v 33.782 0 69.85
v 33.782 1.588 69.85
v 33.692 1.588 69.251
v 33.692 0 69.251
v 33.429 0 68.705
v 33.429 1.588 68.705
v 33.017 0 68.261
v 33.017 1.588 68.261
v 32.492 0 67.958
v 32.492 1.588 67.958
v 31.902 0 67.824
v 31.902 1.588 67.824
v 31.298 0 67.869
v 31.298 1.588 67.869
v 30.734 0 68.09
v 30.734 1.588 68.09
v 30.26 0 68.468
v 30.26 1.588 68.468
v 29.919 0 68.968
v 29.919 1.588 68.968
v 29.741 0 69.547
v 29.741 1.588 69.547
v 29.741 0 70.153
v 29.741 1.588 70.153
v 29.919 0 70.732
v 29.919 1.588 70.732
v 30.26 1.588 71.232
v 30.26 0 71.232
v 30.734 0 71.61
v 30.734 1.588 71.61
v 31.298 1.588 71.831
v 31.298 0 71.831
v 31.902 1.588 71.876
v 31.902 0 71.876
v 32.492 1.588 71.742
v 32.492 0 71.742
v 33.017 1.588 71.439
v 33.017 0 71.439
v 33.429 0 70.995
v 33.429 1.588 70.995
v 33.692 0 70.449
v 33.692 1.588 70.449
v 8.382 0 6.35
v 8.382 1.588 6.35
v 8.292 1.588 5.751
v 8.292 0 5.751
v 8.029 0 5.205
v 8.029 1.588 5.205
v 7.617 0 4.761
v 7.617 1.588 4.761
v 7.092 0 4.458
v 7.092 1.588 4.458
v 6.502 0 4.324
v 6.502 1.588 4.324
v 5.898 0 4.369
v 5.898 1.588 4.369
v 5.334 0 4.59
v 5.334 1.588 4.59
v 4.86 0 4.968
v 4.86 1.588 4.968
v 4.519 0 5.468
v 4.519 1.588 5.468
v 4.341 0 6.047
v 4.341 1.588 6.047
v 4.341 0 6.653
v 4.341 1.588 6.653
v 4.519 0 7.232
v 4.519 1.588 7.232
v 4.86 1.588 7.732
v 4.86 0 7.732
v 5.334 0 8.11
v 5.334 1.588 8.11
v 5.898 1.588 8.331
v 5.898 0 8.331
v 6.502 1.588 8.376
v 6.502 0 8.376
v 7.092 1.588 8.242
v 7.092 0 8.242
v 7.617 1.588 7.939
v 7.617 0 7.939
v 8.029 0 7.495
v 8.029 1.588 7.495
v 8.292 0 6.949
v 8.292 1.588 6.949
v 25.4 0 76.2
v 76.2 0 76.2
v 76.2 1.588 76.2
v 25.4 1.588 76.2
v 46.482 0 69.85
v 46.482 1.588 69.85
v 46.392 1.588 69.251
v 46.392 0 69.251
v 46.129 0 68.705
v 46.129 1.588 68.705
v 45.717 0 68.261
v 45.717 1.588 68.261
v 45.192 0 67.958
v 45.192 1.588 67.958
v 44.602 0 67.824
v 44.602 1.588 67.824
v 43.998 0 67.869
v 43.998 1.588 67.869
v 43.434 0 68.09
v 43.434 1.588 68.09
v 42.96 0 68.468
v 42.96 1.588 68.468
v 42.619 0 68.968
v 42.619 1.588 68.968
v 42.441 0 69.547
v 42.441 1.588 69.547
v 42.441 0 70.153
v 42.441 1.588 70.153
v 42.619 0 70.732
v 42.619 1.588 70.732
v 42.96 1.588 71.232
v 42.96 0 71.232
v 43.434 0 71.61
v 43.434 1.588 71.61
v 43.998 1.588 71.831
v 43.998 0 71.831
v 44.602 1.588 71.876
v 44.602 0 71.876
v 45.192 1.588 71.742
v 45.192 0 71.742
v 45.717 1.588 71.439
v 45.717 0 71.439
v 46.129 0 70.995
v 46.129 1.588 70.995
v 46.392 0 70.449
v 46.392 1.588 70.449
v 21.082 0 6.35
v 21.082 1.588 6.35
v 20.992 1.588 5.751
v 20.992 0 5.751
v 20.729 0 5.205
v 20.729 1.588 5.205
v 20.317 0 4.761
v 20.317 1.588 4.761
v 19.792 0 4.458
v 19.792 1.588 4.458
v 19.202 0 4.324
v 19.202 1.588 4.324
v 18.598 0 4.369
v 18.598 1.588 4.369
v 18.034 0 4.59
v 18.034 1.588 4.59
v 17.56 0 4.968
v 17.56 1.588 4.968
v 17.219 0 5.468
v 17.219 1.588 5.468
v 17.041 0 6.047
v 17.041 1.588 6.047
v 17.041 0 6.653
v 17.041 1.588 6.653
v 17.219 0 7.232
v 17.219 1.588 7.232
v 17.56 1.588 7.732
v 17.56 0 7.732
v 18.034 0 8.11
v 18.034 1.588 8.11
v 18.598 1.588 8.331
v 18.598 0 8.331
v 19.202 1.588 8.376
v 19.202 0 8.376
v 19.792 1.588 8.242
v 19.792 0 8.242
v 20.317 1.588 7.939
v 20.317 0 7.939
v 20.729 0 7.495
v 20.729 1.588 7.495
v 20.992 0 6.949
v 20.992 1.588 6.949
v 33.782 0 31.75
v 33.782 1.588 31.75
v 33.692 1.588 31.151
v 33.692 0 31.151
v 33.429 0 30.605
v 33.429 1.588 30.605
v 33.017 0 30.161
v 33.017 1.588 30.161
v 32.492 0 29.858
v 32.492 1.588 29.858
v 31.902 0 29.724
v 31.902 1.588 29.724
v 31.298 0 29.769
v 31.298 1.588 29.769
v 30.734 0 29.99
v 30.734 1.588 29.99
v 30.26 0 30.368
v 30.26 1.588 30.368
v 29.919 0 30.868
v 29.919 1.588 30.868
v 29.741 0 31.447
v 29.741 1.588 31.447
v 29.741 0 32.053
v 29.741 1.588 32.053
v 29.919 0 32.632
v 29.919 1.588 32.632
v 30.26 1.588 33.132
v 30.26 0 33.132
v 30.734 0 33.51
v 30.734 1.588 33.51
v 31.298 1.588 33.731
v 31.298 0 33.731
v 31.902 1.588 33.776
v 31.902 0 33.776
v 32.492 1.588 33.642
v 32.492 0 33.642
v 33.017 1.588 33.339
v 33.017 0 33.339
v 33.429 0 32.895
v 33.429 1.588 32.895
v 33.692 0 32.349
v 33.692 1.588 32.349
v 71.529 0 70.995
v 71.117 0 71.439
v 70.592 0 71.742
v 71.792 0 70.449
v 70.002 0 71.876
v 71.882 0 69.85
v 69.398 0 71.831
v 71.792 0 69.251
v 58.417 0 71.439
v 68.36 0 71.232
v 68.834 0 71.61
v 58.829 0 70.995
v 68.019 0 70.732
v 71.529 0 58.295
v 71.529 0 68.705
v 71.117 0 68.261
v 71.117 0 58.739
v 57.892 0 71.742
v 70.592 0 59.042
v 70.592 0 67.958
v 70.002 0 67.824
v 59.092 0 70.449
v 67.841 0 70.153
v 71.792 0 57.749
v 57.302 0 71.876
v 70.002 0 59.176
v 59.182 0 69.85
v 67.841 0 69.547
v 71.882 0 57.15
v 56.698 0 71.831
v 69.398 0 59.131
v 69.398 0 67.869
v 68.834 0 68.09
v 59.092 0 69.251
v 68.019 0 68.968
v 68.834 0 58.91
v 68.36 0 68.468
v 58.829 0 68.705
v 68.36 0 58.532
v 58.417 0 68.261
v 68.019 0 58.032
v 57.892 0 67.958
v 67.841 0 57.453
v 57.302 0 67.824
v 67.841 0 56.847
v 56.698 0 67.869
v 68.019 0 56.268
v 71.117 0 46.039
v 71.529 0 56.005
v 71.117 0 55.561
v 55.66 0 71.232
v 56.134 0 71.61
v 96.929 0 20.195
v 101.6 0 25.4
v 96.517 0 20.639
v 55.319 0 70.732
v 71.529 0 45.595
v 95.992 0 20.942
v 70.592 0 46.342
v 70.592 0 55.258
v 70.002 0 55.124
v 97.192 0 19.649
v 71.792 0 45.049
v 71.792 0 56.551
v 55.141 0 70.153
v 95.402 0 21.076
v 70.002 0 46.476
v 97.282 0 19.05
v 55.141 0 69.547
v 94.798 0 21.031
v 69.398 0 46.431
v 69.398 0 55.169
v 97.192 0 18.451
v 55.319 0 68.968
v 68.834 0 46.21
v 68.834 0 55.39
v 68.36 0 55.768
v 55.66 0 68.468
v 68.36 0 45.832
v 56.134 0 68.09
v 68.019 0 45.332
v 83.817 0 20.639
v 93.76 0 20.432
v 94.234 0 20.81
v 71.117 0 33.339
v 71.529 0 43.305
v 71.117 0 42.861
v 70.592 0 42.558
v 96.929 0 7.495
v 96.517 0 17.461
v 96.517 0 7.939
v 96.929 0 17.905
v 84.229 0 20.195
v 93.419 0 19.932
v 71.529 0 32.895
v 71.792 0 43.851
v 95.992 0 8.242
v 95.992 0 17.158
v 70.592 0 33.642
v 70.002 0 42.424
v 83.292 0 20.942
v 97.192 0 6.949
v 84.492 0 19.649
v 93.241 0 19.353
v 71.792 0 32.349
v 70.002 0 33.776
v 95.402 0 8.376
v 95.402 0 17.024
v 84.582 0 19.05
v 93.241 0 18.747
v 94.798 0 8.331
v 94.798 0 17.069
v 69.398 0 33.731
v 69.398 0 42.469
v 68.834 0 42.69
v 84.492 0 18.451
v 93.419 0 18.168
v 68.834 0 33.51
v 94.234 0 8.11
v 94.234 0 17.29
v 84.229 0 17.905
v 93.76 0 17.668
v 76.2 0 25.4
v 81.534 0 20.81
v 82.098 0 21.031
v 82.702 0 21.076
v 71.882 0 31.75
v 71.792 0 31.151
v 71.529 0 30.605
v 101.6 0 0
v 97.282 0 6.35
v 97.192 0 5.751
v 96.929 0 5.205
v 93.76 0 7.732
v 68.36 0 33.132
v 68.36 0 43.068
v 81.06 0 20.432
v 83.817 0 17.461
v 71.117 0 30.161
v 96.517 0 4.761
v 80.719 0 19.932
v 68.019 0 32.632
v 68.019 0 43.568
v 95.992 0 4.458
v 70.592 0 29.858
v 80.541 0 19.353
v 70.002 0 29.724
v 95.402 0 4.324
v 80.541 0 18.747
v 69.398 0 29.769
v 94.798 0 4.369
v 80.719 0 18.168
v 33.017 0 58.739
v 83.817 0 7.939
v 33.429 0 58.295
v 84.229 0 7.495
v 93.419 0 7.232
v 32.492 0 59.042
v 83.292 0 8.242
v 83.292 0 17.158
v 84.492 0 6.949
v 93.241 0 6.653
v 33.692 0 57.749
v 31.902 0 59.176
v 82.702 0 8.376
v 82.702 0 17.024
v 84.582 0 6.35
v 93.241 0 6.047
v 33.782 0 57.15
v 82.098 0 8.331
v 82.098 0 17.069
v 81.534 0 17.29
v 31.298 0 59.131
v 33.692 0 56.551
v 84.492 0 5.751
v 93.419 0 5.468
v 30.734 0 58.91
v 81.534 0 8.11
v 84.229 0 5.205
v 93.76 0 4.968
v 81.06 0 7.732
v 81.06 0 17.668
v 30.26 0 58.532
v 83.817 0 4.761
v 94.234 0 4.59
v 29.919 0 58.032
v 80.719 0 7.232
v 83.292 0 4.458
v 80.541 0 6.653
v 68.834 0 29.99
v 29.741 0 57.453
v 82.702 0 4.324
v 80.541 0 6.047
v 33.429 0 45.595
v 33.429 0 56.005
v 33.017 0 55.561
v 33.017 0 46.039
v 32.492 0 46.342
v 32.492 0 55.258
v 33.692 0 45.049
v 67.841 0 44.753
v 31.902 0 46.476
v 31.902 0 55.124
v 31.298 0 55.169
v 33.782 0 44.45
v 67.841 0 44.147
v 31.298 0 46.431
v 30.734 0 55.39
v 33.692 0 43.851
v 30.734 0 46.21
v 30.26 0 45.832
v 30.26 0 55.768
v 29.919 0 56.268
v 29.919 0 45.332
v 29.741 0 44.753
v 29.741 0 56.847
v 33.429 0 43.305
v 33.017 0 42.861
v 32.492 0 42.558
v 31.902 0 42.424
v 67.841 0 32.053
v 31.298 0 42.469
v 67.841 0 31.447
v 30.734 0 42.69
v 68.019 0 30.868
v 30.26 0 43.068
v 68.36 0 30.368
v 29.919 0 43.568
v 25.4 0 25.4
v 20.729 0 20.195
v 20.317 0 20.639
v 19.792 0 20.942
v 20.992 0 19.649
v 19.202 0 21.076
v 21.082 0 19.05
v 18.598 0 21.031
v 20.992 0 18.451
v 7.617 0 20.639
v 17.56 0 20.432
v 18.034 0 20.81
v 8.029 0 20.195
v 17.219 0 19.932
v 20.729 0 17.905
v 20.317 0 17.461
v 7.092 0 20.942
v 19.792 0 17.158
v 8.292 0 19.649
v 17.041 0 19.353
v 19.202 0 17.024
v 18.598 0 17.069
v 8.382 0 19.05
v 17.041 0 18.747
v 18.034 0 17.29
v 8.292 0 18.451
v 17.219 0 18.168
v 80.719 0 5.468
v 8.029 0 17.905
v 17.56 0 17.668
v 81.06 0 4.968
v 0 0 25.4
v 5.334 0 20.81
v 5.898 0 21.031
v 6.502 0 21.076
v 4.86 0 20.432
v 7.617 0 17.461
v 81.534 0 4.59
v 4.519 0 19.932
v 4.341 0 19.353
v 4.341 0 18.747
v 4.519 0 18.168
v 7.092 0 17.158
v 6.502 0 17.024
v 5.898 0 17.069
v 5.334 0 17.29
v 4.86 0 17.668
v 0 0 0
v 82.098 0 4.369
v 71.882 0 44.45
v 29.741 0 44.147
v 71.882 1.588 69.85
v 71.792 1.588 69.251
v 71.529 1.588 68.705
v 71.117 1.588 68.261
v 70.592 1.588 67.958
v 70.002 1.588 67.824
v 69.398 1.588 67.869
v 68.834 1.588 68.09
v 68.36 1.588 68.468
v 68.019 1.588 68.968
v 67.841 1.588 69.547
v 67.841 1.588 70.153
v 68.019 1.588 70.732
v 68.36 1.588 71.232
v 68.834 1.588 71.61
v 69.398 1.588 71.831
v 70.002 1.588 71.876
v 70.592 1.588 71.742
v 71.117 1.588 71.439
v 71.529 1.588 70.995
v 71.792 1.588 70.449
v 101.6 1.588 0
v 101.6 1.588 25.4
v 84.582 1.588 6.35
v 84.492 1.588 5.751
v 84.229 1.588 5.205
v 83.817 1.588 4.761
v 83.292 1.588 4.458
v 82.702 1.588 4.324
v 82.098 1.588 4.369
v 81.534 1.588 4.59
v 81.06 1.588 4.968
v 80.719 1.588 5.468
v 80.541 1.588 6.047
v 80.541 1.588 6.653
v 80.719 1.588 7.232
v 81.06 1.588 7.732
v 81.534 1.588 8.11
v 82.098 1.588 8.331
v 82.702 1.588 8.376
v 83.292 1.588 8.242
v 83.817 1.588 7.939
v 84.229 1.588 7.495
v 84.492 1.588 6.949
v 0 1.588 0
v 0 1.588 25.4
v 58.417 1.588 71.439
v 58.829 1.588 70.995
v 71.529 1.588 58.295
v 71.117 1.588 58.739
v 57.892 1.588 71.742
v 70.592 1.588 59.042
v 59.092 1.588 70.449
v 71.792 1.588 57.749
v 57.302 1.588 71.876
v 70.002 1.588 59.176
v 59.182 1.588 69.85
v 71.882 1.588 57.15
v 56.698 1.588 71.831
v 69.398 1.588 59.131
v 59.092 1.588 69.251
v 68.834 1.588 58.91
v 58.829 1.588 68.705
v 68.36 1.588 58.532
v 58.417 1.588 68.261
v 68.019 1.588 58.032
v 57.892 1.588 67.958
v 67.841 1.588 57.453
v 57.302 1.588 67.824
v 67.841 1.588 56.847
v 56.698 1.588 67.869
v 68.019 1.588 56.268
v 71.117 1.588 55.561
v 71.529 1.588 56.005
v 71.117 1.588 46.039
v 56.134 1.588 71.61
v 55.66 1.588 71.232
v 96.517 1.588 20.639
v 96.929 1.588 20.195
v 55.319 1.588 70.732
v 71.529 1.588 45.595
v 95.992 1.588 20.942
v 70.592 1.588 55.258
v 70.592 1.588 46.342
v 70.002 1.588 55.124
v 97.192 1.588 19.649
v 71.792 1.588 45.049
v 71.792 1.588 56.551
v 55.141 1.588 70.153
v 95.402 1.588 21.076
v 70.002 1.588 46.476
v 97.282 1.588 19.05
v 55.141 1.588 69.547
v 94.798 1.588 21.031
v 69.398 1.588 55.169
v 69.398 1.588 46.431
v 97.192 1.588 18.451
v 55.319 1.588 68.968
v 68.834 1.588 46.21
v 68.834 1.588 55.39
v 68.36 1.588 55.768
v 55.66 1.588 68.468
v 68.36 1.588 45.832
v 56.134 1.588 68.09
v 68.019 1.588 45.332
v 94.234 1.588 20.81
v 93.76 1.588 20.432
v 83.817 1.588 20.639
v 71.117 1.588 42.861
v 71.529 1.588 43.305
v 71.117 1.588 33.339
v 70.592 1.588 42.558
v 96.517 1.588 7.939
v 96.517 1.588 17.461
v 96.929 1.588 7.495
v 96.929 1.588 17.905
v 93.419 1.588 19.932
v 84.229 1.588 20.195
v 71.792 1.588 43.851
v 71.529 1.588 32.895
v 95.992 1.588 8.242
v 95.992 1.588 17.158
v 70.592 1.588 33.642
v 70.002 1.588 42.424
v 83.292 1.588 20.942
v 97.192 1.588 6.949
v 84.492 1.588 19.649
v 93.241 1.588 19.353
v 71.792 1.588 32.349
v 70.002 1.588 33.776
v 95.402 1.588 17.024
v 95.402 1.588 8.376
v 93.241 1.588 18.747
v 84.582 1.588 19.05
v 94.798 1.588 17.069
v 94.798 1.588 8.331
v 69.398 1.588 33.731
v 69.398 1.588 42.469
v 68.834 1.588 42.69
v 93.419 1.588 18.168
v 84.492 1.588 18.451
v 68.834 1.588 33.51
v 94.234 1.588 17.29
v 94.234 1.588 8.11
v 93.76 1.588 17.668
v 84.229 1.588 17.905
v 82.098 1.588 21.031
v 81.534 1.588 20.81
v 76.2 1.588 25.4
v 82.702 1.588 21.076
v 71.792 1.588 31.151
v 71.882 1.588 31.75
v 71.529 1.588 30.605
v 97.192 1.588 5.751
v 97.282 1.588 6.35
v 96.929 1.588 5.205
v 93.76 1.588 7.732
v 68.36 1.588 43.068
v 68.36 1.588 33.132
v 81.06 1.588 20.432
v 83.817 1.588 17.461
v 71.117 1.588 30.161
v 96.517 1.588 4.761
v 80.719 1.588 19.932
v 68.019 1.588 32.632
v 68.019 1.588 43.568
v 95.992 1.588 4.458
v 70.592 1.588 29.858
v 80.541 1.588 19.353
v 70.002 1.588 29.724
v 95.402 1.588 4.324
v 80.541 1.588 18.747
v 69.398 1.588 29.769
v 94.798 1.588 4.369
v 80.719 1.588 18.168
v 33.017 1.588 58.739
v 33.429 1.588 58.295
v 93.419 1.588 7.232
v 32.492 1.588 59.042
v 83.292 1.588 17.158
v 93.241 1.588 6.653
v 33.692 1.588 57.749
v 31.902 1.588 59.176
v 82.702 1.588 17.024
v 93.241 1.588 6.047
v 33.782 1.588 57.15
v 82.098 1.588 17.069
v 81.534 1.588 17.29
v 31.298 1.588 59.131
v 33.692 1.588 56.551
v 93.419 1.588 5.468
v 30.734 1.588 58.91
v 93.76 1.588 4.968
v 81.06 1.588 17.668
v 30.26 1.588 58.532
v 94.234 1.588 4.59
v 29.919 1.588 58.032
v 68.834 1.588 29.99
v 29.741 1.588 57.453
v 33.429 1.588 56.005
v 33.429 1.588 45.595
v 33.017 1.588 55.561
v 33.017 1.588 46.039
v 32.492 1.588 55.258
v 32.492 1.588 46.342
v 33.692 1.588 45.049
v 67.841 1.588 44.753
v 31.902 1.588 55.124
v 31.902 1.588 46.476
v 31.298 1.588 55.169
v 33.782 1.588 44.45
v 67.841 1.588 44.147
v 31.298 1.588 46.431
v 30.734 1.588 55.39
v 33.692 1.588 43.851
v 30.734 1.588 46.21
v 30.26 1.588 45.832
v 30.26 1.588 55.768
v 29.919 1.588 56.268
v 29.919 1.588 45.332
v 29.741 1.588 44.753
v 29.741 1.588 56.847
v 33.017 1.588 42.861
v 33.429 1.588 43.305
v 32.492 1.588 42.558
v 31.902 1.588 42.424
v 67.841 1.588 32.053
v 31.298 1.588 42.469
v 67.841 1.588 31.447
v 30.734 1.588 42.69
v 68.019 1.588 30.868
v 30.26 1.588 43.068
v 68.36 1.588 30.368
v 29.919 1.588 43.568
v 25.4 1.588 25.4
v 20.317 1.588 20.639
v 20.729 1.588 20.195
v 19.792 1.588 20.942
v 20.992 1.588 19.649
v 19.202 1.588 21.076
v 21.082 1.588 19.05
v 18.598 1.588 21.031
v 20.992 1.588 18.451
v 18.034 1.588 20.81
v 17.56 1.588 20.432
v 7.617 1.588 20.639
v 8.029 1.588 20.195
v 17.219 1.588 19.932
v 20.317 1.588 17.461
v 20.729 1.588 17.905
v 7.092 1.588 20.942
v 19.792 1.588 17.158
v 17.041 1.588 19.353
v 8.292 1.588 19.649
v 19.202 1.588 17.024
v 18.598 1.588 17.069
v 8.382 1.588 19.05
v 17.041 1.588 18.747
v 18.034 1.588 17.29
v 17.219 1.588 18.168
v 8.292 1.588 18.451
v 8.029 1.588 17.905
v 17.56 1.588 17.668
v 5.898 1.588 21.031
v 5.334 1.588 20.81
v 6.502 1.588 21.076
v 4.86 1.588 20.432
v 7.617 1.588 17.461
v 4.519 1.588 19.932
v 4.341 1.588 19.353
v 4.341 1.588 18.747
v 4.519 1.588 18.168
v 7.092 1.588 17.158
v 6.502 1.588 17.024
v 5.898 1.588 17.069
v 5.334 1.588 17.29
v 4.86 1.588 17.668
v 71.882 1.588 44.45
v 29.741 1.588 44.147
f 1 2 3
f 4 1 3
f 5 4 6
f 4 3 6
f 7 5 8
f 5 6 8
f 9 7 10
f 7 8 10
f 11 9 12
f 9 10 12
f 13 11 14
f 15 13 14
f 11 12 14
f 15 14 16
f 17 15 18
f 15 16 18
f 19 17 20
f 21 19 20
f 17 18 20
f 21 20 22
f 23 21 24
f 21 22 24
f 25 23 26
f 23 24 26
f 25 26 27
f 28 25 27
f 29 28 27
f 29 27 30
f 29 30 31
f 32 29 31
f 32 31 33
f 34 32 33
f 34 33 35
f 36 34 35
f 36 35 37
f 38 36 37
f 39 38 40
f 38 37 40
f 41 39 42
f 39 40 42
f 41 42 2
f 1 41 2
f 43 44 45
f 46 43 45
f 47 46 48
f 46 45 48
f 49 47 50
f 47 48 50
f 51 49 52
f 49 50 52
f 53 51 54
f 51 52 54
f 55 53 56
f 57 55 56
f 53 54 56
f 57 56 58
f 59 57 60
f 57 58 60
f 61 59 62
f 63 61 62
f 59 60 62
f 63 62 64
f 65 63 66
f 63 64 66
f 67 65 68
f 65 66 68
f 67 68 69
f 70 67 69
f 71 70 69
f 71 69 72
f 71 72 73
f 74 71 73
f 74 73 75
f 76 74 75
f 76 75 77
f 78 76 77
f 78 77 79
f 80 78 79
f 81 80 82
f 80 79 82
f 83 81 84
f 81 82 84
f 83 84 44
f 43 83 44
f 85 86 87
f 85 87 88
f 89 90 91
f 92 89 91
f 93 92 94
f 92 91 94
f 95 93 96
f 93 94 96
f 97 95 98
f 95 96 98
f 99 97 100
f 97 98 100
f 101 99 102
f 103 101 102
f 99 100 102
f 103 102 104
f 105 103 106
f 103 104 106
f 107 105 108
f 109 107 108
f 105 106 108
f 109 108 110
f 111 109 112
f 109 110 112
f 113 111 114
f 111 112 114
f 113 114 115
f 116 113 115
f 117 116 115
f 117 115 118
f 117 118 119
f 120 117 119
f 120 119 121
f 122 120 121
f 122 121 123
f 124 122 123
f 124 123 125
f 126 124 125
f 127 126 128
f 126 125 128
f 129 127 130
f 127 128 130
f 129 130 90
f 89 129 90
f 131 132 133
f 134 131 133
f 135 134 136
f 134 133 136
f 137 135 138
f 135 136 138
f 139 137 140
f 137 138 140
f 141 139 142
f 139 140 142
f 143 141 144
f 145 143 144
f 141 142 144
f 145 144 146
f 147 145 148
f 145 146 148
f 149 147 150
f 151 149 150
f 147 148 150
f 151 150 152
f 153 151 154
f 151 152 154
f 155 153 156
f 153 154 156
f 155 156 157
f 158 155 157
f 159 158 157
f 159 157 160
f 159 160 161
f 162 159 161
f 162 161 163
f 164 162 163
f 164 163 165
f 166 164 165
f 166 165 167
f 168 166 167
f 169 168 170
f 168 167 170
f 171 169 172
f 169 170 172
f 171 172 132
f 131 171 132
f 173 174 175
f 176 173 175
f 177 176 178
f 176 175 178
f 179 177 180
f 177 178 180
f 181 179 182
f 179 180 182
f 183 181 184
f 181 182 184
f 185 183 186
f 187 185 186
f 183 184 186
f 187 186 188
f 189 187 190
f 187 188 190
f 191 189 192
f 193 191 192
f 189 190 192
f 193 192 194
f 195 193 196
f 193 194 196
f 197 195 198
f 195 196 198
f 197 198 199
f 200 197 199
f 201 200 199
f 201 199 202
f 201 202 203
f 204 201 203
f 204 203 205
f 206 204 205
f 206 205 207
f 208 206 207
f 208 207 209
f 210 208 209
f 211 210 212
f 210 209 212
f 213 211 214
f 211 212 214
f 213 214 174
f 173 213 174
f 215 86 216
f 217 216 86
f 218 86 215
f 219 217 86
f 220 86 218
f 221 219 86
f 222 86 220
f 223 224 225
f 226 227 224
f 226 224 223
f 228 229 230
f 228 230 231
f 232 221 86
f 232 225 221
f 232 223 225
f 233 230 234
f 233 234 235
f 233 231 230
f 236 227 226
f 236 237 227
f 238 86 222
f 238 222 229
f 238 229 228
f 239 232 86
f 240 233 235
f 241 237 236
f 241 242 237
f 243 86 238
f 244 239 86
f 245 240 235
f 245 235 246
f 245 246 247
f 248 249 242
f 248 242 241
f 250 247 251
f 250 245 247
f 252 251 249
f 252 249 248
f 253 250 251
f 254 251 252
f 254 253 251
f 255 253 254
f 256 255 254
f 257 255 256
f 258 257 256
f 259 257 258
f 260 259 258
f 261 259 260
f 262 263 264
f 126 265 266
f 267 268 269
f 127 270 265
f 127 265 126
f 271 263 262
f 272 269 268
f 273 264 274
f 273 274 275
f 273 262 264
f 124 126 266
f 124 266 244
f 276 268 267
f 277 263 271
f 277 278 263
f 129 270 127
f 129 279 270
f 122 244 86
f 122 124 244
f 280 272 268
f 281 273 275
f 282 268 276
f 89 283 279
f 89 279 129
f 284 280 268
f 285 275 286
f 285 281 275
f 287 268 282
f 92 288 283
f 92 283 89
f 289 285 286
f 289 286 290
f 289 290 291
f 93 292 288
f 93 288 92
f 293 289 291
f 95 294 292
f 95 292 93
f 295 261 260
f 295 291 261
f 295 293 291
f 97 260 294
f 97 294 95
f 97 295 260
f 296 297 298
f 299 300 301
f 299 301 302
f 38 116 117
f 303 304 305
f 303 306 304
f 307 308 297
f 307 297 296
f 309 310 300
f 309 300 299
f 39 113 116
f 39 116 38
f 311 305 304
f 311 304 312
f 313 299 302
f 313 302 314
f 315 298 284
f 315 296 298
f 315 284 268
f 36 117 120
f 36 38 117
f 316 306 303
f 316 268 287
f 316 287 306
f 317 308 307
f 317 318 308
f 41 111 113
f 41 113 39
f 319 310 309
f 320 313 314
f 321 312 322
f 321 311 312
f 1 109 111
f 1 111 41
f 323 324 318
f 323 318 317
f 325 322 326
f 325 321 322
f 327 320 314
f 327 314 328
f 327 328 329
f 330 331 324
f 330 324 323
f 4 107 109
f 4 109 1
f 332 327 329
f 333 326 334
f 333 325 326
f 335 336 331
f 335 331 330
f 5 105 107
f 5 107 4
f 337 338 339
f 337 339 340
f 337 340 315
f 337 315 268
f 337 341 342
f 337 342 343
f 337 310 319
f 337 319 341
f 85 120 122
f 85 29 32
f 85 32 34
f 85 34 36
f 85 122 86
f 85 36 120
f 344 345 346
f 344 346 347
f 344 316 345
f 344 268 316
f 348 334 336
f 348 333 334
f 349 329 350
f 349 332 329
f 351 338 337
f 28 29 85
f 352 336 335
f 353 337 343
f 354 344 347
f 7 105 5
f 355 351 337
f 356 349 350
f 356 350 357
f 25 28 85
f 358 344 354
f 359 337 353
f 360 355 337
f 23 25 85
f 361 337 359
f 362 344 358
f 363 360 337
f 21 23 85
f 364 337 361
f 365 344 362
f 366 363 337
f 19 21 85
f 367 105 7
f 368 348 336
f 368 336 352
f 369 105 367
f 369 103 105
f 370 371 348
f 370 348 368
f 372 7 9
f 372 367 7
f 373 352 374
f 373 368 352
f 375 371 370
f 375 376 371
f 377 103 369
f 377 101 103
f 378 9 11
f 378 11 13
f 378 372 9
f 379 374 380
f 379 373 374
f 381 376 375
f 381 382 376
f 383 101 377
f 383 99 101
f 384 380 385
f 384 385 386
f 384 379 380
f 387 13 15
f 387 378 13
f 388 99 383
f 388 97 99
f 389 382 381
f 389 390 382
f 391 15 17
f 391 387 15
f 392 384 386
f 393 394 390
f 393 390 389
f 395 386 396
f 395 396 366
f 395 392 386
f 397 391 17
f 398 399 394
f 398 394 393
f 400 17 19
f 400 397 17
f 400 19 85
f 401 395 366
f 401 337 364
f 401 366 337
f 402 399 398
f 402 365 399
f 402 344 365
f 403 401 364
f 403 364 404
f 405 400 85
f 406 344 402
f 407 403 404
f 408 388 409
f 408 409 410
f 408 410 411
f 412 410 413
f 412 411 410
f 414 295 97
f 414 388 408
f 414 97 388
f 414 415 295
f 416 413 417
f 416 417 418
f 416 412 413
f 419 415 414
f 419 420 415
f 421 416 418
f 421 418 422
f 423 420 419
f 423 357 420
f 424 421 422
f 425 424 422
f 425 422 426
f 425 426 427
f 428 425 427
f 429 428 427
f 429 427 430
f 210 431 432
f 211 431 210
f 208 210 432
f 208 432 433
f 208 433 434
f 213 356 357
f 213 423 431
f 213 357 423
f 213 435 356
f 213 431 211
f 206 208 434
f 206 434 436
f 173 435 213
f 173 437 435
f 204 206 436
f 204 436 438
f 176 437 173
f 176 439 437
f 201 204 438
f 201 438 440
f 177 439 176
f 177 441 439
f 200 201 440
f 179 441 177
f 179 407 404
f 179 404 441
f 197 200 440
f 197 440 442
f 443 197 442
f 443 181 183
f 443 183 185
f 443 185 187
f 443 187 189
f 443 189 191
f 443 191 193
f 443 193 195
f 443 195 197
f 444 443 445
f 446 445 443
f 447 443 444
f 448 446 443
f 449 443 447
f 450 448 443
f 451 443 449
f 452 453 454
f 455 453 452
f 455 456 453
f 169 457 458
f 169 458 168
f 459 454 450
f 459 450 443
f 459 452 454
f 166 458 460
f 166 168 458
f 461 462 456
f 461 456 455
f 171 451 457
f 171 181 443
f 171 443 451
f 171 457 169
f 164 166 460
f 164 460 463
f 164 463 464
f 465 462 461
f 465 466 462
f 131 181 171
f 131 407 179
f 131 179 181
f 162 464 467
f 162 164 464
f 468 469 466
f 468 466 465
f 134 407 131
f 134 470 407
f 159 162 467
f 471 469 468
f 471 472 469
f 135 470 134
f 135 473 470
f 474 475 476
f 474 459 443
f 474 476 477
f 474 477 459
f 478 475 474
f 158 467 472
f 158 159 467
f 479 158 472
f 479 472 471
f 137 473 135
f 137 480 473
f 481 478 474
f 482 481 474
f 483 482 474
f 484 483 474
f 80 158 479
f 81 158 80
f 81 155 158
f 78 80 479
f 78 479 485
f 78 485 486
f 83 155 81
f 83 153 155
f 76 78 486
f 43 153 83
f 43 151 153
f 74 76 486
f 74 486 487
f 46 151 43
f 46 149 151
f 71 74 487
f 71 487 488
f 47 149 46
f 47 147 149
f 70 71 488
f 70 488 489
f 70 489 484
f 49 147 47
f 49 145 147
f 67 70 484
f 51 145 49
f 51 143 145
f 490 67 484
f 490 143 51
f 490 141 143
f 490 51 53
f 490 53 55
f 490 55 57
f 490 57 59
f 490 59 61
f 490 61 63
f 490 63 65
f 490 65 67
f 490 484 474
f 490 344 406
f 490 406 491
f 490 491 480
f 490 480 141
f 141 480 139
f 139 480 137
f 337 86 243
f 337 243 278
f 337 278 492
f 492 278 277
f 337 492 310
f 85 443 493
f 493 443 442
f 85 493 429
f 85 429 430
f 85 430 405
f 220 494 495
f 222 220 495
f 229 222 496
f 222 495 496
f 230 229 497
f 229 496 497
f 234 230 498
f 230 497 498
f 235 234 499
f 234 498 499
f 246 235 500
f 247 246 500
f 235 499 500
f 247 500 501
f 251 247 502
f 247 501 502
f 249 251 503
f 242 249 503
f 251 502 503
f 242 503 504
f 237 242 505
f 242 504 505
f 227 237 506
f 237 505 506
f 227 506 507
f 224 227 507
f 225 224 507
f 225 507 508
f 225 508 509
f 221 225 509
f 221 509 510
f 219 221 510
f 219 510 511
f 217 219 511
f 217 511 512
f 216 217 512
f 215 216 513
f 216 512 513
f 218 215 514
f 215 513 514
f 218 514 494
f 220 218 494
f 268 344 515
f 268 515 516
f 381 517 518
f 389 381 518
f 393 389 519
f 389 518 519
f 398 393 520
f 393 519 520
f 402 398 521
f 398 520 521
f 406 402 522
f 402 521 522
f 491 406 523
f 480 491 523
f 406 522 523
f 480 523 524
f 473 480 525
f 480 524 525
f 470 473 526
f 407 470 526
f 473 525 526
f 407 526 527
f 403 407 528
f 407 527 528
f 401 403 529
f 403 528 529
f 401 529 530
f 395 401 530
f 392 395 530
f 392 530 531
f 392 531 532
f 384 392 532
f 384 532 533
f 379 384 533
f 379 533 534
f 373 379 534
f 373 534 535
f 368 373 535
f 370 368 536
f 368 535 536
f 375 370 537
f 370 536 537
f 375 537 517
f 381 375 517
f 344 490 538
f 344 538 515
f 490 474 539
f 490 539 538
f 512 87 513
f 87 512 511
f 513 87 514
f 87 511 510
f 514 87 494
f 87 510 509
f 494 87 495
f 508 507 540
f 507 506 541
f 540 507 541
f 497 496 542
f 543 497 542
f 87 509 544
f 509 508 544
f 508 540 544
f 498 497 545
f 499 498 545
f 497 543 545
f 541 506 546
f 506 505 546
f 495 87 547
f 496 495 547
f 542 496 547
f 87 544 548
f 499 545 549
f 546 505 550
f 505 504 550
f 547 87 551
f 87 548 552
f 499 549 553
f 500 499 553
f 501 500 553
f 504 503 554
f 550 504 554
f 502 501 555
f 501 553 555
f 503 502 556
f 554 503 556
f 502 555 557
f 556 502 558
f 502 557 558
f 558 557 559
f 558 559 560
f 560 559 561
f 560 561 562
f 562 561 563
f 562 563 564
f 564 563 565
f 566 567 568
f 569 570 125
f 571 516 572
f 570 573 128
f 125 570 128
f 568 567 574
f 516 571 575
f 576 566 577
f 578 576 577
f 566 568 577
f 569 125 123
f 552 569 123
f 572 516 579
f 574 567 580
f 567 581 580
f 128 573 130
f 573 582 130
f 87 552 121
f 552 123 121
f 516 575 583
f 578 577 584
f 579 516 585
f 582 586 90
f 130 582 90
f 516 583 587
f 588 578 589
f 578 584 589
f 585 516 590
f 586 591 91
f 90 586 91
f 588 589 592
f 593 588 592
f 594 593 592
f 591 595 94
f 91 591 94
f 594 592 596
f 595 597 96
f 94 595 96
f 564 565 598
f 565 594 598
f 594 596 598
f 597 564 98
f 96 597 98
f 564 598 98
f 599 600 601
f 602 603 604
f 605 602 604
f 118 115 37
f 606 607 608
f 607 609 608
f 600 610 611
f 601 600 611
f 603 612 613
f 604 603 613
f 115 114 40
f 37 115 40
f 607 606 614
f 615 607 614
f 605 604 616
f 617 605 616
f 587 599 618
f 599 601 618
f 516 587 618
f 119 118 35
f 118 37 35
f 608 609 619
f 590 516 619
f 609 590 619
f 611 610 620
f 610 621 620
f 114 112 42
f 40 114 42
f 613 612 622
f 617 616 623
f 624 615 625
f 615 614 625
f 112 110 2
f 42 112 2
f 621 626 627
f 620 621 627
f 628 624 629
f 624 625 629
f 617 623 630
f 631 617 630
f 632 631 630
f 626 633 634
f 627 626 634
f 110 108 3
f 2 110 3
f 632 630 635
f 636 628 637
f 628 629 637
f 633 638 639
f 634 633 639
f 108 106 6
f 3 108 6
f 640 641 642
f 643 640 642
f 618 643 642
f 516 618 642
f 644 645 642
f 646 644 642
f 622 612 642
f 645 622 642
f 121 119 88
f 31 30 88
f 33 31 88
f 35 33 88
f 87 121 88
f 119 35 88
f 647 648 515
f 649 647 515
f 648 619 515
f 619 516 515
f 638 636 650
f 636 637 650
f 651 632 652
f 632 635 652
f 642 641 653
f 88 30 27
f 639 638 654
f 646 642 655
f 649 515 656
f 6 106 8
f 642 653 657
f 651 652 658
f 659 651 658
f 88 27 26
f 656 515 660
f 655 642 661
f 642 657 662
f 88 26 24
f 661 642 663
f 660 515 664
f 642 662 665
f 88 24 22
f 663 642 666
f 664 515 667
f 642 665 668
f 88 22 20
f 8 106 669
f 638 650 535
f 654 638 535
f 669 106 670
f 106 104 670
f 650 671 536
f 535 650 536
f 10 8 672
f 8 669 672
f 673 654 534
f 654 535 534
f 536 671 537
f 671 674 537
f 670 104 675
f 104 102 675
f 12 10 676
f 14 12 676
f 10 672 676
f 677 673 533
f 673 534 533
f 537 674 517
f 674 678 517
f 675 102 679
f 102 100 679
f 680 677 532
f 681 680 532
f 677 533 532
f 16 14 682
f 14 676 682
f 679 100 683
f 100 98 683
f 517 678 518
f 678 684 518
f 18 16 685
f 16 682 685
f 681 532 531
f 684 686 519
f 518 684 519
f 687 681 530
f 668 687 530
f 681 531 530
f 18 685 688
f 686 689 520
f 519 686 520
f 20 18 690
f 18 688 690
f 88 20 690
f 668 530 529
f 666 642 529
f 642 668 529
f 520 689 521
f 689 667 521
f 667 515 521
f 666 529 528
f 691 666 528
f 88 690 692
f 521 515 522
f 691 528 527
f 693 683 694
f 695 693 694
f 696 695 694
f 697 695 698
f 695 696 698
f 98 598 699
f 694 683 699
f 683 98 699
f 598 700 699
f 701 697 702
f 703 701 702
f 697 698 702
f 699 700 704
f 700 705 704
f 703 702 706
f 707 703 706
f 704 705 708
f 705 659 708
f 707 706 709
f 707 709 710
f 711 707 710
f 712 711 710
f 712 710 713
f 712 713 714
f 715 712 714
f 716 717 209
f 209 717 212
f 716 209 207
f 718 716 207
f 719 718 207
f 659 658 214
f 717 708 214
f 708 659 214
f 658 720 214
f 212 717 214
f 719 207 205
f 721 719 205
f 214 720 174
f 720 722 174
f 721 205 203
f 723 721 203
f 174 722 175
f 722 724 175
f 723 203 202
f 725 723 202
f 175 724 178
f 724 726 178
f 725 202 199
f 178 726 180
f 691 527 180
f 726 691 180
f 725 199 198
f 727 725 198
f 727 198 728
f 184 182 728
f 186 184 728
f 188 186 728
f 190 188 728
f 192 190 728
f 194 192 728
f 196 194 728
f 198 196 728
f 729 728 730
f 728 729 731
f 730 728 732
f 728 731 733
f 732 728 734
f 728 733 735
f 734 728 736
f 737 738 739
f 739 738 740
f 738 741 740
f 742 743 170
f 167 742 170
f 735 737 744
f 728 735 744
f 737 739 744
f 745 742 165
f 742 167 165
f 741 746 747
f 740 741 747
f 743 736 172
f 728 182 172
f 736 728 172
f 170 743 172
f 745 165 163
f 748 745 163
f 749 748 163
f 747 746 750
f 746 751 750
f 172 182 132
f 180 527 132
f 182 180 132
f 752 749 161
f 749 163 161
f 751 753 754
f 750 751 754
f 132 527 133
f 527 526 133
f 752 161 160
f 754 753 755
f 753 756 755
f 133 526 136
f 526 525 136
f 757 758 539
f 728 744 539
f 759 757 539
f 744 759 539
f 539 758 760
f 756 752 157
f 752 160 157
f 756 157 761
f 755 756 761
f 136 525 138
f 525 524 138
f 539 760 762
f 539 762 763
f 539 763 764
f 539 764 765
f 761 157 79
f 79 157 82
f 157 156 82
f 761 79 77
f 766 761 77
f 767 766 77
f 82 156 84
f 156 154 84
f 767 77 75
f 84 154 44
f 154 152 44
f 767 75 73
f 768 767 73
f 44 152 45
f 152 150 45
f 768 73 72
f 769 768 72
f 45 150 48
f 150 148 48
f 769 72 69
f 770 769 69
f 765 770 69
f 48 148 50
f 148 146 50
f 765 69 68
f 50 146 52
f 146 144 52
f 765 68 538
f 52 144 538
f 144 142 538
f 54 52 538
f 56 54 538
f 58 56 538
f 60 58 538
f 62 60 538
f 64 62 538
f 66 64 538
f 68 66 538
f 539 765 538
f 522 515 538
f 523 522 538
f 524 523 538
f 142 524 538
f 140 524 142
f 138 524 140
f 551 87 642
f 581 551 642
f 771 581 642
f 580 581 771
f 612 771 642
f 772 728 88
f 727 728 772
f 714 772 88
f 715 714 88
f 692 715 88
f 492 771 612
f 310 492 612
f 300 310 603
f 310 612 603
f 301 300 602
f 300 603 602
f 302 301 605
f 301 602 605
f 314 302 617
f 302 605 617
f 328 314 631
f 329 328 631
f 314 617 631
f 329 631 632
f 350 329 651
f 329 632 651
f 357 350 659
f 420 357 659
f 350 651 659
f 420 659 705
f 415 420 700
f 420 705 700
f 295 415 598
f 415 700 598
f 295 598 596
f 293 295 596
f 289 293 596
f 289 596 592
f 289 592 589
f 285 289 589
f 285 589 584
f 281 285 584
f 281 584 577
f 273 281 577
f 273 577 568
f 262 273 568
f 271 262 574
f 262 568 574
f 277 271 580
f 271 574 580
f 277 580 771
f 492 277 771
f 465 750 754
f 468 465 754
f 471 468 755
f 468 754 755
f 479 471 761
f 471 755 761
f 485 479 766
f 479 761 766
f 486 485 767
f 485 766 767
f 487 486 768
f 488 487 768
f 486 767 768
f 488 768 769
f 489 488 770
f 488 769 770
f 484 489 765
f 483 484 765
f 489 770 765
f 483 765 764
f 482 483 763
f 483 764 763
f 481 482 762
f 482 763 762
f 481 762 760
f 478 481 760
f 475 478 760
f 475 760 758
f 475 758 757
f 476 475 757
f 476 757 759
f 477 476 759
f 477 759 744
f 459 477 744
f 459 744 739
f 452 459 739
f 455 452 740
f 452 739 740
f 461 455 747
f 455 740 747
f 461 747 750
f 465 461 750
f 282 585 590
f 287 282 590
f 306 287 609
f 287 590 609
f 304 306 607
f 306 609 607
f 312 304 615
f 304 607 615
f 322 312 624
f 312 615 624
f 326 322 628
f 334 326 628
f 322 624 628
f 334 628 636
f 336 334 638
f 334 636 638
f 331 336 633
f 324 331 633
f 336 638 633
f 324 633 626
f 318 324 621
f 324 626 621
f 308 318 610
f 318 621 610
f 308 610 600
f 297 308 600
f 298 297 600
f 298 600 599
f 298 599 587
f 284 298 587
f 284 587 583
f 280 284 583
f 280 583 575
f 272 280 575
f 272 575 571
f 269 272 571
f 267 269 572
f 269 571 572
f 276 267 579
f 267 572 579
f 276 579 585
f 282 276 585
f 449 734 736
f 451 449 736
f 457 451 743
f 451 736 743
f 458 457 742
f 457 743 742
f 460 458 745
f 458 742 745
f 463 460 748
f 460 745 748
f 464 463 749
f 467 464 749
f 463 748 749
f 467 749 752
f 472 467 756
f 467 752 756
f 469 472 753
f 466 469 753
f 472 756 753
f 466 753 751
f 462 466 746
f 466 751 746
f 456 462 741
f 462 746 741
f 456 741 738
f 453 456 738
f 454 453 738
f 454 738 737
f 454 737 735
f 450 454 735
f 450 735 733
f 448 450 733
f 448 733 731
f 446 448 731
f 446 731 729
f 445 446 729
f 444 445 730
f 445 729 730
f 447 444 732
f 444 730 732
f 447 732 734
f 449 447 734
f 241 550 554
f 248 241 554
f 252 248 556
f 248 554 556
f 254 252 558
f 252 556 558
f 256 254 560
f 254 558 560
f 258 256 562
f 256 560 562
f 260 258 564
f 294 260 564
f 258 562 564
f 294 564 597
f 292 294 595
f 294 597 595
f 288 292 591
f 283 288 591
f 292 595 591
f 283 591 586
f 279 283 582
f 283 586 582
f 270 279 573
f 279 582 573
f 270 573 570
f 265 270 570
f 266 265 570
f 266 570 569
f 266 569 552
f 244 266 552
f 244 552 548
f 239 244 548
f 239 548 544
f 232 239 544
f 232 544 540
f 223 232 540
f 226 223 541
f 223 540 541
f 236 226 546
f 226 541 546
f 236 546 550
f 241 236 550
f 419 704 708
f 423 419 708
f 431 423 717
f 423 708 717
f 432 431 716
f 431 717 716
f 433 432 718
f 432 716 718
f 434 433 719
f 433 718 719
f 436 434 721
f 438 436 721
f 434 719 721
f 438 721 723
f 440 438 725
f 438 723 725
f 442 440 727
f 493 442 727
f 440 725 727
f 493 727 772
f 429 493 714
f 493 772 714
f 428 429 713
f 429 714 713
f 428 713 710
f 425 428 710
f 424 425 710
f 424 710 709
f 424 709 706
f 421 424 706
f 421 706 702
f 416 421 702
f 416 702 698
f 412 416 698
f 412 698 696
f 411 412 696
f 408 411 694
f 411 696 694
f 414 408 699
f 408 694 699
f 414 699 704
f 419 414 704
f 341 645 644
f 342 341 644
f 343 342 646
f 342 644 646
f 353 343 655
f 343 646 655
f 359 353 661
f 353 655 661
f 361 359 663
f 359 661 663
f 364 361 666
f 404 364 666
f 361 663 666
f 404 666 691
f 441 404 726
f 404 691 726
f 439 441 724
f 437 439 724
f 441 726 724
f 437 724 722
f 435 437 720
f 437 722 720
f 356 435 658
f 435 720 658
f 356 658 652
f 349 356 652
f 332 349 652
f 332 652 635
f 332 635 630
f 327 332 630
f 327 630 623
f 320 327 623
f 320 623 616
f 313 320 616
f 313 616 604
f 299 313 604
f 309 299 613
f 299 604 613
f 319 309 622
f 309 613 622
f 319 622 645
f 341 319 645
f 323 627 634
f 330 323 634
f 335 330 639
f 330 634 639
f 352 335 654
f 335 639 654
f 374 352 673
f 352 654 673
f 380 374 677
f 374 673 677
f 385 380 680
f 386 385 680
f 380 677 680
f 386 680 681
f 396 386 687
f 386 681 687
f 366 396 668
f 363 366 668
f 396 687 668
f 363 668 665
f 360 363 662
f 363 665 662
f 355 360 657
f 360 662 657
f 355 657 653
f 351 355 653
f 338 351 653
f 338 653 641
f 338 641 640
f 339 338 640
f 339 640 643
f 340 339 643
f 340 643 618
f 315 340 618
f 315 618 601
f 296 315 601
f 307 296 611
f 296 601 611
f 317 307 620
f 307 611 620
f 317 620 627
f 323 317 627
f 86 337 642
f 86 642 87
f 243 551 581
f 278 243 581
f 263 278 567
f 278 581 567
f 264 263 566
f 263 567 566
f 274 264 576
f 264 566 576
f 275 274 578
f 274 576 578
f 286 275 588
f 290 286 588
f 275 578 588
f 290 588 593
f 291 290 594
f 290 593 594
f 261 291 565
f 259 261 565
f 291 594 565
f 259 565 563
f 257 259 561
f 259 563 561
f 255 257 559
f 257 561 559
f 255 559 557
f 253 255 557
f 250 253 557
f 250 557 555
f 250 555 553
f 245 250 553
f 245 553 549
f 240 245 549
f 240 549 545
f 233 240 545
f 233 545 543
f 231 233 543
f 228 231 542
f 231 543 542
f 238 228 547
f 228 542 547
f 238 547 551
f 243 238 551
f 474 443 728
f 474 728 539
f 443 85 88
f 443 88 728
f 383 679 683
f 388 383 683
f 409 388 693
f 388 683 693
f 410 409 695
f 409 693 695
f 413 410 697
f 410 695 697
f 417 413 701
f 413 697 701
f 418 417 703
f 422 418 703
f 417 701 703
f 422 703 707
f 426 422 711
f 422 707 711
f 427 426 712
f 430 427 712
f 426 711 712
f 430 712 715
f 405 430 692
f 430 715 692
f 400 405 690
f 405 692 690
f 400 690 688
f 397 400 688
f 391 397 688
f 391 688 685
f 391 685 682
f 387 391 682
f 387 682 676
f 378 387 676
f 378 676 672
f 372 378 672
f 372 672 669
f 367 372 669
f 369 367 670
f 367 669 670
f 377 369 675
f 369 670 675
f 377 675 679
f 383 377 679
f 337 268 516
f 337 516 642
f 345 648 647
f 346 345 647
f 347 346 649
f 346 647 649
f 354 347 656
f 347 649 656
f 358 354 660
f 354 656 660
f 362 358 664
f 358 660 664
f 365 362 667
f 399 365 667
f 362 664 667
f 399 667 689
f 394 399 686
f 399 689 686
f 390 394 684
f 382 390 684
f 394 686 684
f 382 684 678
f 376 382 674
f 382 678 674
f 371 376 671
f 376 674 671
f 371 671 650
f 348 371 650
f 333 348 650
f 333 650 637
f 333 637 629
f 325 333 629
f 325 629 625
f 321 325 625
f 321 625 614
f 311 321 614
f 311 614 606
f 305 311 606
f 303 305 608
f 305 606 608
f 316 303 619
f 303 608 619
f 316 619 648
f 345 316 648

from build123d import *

# Parameters (mm, degrees)
BOSS_EXTRUDE1_DEPTH = 1.5875
SKETCH4_R           = 2.032
CUT_EXTRUDE1_DEPTH  = 1.5875


with BuildPart() as part:
    # Sketch3 → Boss-Extrude1 (new body)
    with BuildSketch(Plane(origin=(0, 0, 0), x_dir=(1, 0, 0), z_dir=(0, 1, 0))):
        Polygon((0, 0), (101.6, 0), (101.6, -25.4), (76.2, -25.4), (76.2, -76.2), (25.4, -76.2), (25.4, -25.4), (0, -25.4), align=None)
    extrude(amount=BOSS_EXTRUDE1_DEPTH)

    # Sketch4 → Cut-Extrude1 (cut)
    with BuildSketch(Plane(origin=(0, 1.5875, 0), x_dir=(1, 0, 0), z_dir=(0, 1, 0))):
        with Locations((6.35, -6.35)):
            Circle(SKETCH4_R)
        with Locations((19.05, -6.35)):
            Circle(SKETCH4_R)
        with Locations((82.55, -6.35)):
            Circle(SKETCH4_R)
        with Locations((95.25, -6.35)):
            Circle(SKETCH4_R)
        with Locations((107.95, -6.35)):
            Circle(SKETCH4_R)
        with Locations((120.65, -6.35)):
            Circle(SKETCH4_R)
        with Locations((133.35, -6.35)):
            Circle(SKETCH4_R)
        with Locations((146.05, -6.35)):
            Circle(SKETCH4_R)
        with Locations((19.05, -19.05)):
            Circle(SKETCH4_R)
        with Locations((82.55, -19.05)):
            Circle(SKETCH4_R)
        with Locations((95.25, -19.05)):
            Circle(SKETCH4_R)
        with Locations((107.95, -19.05)):
            Circle(SKETCH4_R)
        with Locations((120.65, -19.05)):
            Circle(SKETCH4_R)
        with Locations((133.35, -19.05)):
            Circle(SKETCH4_R)
        with Locations((146.05, -19.05)):
            Circle(SKETCH4_R)
        with Locations((19.05, -31.75)):
            Circle(SKETCH4_R)
        with Locations((31.75, -31.75)):
            Circle(SKETCH4_R)
        with Locations((69.85, -31.75)):
            Circle(SKETCH4_R)
        with Locations((82.55, -31.75)):
            Circle(SKETCH4_R)
        with Locations((95.25, -31.75)):
            Circle(SKETCH4_R)
        with Locations((107.95, -31.75)):
            Circle(SKETCH4_R)
        with Locations((120.65, -31.75)):
            Circle(SKETCH4_R)
        with Locations((133.35, -31.75)):
            Circle(SKETCH4_R)
        with Locations((146.05, -31.75)):
            Circle(SKETCH4_R)
        with Locations((19.05, -44.45)):
            Circle(SKETCH4_R)
        with Locations((31.75, -44.45)):
            Circle(SKETCH4_R)
        with Locations((69.85, -44.45)):
            Circle(SKETCH4_R)
        with Locations((82.55, -44.45)):
            Circle(SKETCH4_R)
        with Locations((95.25, -44.45)):
            Circle(SKETCH4_R)
        with Locations((107.95, -44.45)):
            Circle(SKETCH4_R)
        with Locations((120.65, -44.45)):
            Circle(SKETCH4_R)
        with Locations((133.35, -44.45)):
            Circle(SKETCH4_R)
        with Locations((146.05, -44.45)):
            Circle(SKETCH4_R)
        with Locations((19.05, -57.15)):
            Circle(SKETCH4_R)
        with Locations((31.75, -57.15)):
            Circle(SKETCH4_R)
        with Locations((69.85, -57.15)):
            Circle(SKETCH4_R)
        with Locations((82.55, -57.15)):
            Circle(SKETCH4_R)
        with Locations((95.25, -57.15)):
            Circle(SKETCH4_R)
        with Locations((107.95, -57.15)):
            Circle(SKETCH4_R)
        with Locations((120.65, -57.15)):
            Circle(SKETCH4_R)
        with Locations((133.35, -57.15)):
            Circle(SKETCH4_R)
        with Locations((146.05, -57.15)):
            Circle(SKETCH4_R)
        with Locations((19.05, -69.85)):
            Circle(SKETCH4_R)
        with Locations((31.75, -69.85)):
            Circle(SKETCH4_R)
        with Locations((44.45, -69.85)):
            Circle(SKETCH4_R)
        with Locations((57.15, -69.85)):
            Circle(SKETCH4_R)
        with Locations((69.85, -69.85)):
            Circle(SKETCH4_R)
        with Locations((82.55, -69.85)):
            Circle(SKETCH4_R)
        with Locations((95.25, -69.85)):
            Circle(SKETCH4_R)
        with Locations((107.95, -69.85)):
            Circle(SKETCH4_R)
        with Locations((120.65, -69.85)):
            Circle(SKETCH4_R)
        with Locations((133.35, -69.85)):
            Circle(SKETCH4_R)
        with Locations((146.05, -69.85)):
            Circle(SKETCH4_R)
        with Locations((6.35, -19.05)):
            Circle(SKETCH4_R)
        with Locations((6.35, -31.75)):
            Circle(SKETCH4_R)
        with Locations((6.35, -44.45)):
            Circle(SKETCH4_R)
        with Locations((6.35, -57.15)):
            Circle(SKETCH4_R)
        with Locations((6.35, -69.85)):
            Circle(SKETCH4_R)
    extrude(amount=-CUT_EXTRUDE1_DEPTH, mode=Mode.SUBTRACT)


solid = part.part
